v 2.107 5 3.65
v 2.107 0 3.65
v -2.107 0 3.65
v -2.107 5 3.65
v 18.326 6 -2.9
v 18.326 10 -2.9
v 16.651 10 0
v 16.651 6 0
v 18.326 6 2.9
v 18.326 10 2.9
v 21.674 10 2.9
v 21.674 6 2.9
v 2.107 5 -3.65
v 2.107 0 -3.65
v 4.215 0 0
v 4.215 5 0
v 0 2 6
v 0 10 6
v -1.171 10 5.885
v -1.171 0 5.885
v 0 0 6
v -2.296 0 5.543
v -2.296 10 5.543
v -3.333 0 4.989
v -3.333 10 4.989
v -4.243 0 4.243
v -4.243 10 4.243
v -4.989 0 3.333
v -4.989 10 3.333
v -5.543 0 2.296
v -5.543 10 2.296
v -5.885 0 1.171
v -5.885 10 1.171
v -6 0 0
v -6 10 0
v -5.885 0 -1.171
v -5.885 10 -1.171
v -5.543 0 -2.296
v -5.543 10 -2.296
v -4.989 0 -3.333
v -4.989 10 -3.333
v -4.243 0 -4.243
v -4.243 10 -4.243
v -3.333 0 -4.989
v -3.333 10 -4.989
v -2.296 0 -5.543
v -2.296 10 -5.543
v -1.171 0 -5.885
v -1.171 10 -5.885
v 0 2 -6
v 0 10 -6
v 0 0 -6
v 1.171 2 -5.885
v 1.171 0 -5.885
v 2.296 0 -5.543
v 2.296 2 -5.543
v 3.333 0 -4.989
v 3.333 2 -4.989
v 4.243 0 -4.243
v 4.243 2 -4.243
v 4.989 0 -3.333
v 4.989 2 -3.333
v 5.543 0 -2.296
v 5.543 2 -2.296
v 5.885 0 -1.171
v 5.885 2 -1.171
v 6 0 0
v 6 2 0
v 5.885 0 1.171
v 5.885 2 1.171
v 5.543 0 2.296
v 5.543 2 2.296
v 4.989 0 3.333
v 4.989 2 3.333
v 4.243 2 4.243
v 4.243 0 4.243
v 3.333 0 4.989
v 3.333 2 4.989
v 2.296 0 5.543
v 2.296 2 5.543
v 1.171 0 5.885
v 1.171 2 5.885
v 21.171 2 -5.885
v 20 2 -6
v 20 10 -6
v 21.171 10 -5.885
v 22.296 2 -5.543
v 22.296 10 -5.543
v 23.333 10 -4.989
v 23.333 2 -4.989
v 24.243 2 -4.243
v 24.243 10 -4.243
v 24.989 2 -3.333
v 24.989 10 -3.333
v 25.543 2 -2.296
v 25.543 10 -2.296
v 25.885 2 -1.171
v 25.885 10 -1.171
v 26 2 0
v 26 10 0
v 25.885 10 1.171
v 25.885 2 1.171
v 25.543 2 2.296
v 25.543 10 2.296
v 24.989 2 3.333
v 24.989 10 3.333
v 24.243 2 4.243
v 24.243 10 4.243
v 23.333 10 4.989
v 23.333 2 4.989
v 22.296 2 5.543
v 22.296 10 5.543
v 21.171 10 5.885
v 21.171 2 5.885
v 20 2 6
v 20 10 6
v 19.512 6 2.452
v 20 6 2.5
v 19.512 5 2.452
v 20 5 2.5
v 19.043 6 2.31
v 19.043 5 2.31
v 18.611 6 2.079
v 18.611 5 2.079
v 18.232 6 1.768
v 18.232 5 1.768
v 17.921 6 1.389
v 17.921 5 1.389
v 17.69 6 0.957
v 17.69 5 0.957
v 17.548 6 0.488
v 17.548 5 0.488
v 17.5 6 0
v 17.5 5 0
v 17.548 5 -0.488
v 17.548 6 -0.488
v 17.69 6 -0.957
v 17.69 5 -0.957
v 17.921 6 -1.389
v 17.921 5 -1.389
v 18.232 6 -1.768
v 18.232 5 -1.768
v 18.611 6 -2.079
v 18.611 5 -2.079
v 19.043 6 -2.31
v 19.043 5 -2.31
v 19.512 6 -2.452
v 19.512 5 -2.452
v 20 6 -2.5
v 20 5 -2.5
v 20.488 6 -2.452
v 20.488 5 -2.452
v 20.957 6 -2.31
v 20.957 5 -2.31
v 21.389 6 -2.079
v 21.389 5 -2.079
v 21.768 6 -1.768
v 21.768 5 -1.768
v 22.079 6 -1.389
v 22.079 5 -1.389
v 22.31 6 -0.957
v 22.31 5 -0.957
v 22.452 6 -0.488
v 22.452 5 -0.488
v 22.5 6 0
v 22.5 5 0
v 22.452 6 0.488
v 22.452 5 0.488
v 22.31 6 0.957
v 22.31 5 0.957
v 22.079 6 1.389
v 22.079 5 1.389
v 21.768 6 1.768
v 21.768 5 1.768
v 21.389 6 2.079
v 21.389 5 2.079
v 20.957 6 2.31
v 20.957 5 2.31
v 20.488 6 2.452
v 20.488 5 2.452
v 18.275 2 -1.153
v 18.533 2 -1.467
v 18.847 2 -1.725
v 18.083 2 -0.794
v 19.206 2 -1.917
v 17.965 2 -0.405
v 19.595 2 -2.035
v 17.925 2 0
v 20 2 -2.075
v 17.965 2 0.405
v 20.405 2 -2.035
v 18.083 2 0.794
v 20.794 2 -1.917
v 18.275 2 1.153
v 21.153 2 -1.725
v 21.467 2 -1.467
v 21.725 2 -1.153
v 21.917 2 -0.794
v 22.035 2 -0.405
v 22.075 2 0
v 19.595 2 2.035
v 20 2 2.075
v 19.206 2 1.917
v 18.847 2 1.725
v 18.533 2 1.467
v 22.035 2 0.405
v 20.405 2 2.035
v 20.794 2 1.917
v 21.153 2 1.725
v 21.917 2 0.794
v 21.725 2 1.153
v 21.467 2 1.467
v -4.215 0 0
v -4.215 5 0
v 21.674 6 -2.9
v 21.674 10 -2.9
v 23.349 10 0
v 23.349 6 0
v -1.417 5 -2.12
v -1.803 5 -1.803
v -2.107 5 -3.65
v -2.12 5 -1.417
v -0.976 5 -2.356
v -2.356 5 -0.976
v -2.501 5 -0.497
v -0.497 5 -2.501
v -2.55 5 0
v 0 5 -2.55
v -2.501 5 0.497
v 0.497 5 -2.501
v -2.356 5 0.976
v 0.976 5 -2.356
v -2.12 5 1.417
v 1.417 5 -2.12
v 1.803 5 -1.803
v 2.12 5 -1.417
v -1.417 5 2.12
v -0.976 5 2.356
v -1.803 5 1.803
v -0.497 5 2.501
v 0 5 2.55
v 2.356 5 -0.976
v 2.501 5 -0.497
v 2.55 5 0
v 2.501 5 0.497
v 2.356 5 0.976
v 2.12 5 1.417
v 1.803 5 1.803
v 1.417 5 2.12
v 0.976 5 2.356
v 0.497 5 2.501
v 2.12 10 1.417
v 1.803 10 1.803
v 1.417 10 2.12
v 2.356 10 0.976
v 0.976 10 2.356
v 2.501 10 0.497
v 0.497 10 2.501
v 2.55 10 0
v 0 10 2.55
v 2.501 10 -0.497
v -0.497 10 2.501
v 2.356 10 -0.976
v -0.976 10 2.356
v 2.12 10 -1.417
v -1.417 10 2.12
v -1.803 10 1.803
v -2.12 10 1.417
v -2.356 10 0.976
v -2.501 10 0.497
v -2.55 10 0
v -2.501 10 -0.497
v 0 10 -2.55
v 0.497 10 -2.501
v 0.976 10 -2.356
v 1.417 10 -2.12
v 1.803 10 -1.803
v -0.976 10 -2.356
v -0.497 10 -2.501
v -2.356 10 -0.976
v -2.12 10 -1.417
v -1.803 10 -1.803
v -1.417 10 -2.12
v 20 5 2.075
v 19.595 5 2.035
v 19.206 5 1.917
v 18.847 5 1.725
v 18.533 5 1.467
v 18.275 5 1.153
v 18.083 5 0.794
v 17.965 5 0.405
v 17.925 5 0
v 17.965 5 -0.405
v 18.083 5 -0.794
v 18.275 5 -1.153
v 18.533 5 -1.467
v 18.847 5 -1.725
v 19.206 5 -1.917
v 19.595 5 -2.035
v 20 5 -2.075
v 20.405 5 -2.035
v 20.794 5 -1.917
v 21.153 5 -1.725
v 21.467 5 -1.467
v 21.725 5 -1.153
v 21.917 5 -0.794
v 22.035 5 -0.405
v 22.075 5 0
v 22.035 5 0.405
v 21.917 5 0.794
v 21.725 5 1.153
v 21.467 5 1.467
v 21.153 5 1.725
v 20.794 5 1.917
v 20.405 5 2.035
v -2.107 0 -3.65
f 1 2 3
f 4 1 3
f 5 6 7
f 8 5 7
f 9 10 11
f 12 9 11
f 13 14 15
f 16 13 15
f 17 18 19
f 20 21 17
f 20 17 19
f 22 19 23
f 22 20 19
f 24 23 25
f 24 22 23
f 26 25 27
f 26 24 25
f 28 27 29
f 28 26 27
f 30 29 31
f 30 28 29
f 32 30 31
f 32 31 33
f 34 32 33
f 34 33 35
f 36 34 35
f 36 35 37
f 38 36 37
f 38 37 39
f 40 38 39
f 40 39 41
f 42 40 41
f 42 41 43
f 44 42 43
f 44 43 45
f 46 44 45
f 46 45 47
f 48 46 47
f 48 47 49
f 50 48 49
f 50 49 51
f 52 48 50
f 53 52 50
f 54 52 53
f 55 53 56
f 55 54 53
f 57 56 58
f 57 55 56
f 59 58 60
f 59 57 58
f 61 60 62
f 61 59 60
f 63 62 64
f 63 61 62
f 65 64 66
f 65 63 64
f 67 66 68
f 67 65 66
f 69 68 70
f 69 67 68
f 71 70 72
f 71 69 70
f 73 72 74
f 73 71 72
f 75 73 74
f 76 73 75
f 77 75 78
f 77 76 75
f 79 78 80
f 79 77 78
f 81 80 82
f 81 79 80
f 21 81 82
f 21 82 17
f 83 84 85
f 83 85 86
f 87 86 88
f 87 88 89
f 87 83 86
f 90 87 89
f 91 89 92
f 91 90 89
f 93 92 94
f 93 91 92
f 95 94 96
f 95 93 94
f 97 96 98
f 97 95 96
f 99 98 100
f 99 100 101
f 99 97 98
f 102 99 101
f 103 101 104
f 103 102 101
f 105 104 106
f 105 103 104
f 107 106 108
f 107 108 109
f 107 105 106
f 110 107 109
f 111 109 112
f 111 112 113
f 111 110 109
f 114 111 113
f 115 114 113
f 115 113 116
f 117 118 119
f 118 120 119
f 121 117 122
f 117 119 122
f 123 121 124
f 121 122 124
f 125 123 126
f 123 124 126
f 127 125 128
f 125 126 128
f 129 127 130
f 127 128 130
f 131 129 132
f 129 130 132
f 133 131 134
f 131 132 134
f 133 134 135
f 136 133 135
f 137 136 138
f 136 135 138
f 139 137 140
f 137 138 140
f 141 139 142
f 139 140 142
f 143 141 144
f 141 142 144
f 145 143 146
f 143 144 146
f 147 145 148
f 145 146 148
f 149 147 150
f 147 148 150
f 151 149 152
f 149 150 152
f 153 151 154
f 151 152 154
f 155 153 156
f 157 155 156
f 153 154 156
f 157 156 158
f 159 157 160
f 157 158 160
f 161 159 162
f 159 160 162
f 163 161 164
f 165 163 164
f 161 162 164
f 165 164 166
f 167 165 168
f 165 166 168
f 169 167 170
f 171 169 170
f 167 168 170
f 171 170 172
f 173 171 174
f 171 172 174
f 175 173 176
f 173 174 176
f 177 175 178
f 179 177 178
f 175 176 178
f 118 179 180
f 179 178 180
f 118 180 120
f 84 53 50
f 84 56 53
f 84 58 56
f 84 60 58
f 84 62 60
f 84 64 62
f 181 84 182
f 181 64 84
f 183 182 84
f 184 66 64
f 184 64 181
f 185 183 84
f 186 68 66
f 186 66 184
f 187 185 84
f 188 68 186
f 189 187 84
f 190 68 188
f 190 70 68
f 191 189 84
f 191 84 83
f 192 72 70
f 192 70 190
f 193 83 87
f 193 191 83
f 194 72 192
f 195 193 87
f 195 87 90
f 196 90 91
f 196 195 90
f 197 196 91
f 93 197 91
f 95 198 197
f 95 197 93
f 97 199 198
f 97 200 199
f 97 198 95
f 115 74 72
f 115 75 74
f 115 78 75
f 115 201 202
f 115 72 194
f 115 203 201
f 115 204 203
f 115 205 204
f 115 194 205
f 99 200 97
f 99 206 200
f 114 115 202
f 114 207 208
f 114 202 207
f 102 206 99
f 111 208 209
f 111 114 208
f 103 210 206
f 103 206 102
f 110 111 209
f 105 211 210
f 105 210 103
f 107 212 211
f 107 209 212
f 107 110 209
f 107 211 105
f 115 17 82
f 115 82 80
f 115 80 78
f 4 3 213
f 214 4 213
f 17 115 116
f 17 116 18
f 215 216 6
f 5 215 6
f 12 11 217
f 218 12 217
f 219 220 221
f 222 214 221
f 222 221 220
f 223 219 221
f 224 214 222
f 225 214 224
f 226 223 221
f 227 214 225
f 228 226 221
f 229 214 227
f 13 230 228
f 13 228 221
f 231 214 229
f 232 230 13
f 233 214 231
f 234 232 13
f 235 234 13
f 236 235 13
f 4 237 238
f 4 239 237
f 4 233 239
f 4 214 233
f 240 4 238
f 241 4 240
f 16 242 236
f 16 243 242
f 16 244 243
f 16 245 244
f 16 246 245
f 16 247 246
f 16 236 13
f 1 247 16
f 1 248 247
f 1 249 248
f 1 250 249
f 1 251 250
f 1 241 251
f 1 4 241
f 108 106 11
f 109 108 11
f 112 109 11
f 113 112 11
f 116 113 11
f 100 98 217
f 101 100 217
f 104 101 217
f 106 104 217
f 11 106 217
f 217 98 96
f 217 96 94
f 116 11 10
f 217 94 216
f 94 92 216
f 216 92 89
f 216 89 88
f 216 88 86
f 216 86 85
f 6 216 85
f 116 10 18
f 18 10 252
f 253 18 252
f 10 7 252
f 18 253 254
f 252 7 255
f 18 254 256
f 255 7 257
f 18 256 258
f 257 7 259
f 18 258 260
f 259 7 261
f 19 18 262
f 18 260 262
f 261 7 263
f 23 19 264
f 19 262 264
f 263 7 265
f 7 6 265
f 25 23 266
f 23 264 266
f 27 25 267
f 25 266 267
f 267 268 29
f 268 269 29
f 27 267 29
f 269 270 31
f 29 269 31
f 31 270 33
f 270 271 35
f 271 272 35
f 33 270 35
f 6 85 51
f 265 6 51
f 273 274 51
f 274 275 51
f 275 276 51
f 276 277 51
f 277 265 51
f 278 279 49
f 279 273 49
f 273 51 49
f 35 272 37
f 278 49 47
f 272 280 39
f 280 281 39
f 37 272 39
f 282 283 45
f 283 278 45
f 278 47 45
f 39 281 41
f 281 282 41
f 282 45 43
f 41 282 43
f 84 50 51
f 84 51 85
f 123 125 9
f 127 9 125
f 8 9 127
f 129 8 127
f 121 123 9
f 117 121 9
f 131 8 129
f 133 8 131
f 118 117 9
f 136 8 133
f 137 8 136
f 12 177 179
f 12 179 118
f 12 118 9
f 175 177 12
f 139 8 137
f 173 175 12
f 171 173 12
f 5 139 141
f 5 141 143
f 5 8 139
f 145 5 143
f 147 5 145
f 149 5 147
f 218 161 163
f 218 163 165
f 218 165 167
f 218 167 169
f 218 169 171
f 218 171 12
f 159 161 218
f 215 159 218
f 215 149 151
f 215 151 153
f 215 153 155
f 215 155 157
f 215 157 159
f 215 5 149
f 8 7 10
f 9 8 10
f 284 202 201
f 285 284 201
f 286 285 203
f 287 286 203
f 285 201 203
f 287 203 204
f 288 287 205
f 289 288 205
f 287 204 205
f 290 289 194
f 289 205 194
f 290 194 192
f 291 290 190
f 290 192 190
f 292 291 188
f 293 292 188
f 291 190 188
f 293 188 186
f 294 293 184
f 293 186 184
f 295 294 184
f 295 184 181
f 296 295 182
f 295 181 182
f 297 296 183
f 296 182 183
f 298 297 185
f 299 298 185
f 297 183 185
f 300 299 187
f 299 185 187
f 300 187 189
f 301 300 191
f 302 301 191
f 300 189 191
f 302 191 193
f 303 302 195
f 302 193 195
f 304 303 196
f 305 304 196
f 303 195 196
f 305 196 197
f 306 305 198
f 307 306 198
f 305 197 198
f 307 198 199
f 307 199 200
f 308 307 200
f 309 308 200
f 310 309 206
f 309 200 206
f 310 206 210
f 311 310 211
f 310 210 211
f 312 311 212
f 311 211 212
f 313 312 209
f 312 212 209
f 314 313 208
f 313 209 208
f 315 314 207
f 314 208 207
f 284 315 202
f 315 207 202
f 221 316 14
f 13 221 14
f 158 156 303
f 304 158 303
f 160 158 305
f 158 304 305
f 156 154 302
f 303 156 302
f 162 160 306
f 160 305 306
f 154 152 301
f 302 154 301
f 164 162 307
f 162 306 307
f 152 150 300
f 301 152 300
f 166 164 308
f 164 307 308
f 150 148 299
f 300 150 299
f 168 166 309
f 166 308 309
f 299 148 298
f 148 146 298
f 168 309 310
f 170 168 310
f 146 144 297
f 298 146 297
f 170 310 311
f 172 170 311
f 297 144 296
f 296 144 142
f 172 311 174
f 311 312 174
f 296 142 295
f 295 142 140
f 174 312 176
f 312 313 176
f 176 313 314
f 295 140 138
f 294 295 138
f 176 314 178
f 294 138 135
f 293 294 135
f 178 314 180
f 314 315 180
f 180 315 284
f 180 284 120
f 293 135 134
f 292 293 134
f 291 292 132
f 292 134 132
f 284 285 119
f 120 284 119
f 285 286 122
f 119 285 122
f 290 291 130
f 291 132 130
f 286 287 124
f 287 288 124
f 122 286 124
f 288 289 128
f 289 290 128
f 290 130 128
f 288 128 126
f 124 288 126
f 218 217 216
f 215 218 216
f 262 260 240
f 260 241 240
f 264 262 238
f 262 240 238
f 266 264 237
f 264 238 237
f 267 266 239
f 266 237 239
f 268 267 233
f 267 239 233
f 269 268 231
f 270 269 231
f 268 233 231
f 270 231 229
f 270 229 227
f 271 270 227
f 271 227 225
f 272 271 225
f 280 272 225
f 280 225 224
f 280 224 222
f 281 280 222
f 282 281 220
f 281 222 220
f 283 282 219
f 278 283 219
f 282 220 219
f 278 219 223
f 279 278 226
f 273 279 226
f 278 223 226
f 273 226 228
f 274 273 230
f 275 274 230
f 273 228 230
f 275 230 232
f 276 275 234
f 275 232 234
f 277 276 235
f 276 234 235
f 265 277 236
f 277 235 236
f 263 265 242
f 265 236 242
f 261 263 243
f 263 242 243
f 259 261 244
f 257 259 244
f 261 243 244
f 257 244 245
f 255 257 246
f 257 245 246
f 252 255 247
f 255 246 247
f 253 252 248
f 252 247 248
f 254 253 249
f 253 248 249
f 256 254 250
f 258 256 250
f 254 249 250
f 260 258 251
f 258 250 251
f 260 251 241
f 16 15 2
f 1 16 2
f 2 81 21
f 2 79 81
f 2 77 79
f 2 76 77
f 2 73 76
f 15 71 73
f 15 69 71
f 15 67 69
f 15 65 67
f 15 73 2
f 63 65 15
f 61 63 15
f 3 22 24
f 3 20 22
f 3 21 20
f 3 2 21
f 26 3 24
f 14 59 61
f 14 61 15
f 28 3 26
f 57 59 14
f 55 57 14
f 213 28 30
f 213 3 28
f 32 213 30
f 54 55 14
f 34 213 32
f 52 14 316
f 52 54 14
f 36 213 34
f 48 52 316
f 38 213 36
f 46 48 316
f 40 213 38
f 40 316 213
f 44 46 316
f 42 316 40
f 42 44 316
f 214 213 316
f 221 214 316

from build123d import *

# Parameters (mm, degrees)
EXTRUDE_1_DEPTH     = 10
CUT_EXTRUDE_1_DEPTH = 5
SKETCH_6_R          = 27.317981471
SKETCH_6_R_2        = 6
CUT_EXTRUDE_2_DEPTH = 2
CUT_EXTRUDE_3_DEPTH = 4


with BuildPart() as part:
    # 草图1 → 凸台-拉伸1 (new body)
    with BuildSketch(Plane(origin=(0, 0, 0), x_dir=(1, 0, 0), z_dir=(0, 1, 0))):
        with BuildLine():
            Line((0, 6), (20, 6))
            ThreePointArc((20, 6), (26, 0), (20, -6))
            Line((20, -6), (0, -6))
            ThreePointArc((0, -6), (-6, 0), (0, 6))
        make_face()
    extrude(amount=EXTRUDE_1_DEPTH)

    # 草图3 → 切除-旋转2 (revolve, cut)
    with BuildSketch(Plane.XY, mode=Mode.PRIVATE) as cut_revolve_2_sk:
        Polygon((0, 10), (-2.55, 10), (-2.55, 5), (-2.1, 5), (-2.1, 2), (-2.55, 2), (-2.55, 0), (0, 0), align=None)
    revolve(cut_revolve_2_sk.sketch.rotate(Axis((0, 10, 0), (0, -1, 0)), 270), axis=Axis((0, 10, 0), (0, -1, 0)), mode=Mode.SUBTRACT)

    # 草图4 → 切除-旋转3 (revolve, cut)
    with BuildSketch(Plane.XY, mode=Mode.PRIVATE) as cut_revolve_3_sk:
        Polygon((20, 10), (17.5, 10), (17.5, 5), (17.925, 5), (17.925, 0), (20, 0), align=None)
    revolve(cut_revolve_3_sk.sketch.rotate(Axis((20, 10, 0), (0, -1, 0)), 270), axis=Axis((20, 10, 0), (0, -1, 0)), mode=Mode.SUBTRACT)

    # 草图5 → 切除-拉伸1 (cut)
    with BuildSketch(Plane.XZ):
        Polygon((-4.214656965, 0), (-2.107328483, -3.65), (2.107328483, -3.65), (4.214656965, 0), (2.107328483, 3.65), (-2.107328483, 3.65), align=None)
    extrude(amount=-CUT_EXTRUDE_1_DEPTH, mode=Mode.SUBTRACT)

    # 草图6 → 切除-拉伸2 (cut)
    with BuildSketch(Plane.XZ):
        Circle(SKETCH_6_R)
        with Locations(Location((0, 0, 0), (0, 0, 90))):
            Circle(SKETCH_6_R_2, mode=Mode.SUBTRACT)
    extrude(amount=-CUT_EXTRUDE_2_DEPTH, mode=Mode.SUBTRACT)

    # 草图7 → 切除-拉伸3 (cut)
    with BuildSketch(Plane(origin=(0, 10, 0), x_dir=(1, 0, 0), z_dir=(0, 1, 0))):
        Polygon((18.325684219, 2.9), (16.651368439, 0), (18.325684219, -2.9), (21.674315781, -2.9), (23.348631561, 0), (21.674315781, 2.9), align=None)
    extrude(amount=-CUT_EXTRUDE_3_DEPTH, mode=Mode.SUBTRACT)


solid = part.part
